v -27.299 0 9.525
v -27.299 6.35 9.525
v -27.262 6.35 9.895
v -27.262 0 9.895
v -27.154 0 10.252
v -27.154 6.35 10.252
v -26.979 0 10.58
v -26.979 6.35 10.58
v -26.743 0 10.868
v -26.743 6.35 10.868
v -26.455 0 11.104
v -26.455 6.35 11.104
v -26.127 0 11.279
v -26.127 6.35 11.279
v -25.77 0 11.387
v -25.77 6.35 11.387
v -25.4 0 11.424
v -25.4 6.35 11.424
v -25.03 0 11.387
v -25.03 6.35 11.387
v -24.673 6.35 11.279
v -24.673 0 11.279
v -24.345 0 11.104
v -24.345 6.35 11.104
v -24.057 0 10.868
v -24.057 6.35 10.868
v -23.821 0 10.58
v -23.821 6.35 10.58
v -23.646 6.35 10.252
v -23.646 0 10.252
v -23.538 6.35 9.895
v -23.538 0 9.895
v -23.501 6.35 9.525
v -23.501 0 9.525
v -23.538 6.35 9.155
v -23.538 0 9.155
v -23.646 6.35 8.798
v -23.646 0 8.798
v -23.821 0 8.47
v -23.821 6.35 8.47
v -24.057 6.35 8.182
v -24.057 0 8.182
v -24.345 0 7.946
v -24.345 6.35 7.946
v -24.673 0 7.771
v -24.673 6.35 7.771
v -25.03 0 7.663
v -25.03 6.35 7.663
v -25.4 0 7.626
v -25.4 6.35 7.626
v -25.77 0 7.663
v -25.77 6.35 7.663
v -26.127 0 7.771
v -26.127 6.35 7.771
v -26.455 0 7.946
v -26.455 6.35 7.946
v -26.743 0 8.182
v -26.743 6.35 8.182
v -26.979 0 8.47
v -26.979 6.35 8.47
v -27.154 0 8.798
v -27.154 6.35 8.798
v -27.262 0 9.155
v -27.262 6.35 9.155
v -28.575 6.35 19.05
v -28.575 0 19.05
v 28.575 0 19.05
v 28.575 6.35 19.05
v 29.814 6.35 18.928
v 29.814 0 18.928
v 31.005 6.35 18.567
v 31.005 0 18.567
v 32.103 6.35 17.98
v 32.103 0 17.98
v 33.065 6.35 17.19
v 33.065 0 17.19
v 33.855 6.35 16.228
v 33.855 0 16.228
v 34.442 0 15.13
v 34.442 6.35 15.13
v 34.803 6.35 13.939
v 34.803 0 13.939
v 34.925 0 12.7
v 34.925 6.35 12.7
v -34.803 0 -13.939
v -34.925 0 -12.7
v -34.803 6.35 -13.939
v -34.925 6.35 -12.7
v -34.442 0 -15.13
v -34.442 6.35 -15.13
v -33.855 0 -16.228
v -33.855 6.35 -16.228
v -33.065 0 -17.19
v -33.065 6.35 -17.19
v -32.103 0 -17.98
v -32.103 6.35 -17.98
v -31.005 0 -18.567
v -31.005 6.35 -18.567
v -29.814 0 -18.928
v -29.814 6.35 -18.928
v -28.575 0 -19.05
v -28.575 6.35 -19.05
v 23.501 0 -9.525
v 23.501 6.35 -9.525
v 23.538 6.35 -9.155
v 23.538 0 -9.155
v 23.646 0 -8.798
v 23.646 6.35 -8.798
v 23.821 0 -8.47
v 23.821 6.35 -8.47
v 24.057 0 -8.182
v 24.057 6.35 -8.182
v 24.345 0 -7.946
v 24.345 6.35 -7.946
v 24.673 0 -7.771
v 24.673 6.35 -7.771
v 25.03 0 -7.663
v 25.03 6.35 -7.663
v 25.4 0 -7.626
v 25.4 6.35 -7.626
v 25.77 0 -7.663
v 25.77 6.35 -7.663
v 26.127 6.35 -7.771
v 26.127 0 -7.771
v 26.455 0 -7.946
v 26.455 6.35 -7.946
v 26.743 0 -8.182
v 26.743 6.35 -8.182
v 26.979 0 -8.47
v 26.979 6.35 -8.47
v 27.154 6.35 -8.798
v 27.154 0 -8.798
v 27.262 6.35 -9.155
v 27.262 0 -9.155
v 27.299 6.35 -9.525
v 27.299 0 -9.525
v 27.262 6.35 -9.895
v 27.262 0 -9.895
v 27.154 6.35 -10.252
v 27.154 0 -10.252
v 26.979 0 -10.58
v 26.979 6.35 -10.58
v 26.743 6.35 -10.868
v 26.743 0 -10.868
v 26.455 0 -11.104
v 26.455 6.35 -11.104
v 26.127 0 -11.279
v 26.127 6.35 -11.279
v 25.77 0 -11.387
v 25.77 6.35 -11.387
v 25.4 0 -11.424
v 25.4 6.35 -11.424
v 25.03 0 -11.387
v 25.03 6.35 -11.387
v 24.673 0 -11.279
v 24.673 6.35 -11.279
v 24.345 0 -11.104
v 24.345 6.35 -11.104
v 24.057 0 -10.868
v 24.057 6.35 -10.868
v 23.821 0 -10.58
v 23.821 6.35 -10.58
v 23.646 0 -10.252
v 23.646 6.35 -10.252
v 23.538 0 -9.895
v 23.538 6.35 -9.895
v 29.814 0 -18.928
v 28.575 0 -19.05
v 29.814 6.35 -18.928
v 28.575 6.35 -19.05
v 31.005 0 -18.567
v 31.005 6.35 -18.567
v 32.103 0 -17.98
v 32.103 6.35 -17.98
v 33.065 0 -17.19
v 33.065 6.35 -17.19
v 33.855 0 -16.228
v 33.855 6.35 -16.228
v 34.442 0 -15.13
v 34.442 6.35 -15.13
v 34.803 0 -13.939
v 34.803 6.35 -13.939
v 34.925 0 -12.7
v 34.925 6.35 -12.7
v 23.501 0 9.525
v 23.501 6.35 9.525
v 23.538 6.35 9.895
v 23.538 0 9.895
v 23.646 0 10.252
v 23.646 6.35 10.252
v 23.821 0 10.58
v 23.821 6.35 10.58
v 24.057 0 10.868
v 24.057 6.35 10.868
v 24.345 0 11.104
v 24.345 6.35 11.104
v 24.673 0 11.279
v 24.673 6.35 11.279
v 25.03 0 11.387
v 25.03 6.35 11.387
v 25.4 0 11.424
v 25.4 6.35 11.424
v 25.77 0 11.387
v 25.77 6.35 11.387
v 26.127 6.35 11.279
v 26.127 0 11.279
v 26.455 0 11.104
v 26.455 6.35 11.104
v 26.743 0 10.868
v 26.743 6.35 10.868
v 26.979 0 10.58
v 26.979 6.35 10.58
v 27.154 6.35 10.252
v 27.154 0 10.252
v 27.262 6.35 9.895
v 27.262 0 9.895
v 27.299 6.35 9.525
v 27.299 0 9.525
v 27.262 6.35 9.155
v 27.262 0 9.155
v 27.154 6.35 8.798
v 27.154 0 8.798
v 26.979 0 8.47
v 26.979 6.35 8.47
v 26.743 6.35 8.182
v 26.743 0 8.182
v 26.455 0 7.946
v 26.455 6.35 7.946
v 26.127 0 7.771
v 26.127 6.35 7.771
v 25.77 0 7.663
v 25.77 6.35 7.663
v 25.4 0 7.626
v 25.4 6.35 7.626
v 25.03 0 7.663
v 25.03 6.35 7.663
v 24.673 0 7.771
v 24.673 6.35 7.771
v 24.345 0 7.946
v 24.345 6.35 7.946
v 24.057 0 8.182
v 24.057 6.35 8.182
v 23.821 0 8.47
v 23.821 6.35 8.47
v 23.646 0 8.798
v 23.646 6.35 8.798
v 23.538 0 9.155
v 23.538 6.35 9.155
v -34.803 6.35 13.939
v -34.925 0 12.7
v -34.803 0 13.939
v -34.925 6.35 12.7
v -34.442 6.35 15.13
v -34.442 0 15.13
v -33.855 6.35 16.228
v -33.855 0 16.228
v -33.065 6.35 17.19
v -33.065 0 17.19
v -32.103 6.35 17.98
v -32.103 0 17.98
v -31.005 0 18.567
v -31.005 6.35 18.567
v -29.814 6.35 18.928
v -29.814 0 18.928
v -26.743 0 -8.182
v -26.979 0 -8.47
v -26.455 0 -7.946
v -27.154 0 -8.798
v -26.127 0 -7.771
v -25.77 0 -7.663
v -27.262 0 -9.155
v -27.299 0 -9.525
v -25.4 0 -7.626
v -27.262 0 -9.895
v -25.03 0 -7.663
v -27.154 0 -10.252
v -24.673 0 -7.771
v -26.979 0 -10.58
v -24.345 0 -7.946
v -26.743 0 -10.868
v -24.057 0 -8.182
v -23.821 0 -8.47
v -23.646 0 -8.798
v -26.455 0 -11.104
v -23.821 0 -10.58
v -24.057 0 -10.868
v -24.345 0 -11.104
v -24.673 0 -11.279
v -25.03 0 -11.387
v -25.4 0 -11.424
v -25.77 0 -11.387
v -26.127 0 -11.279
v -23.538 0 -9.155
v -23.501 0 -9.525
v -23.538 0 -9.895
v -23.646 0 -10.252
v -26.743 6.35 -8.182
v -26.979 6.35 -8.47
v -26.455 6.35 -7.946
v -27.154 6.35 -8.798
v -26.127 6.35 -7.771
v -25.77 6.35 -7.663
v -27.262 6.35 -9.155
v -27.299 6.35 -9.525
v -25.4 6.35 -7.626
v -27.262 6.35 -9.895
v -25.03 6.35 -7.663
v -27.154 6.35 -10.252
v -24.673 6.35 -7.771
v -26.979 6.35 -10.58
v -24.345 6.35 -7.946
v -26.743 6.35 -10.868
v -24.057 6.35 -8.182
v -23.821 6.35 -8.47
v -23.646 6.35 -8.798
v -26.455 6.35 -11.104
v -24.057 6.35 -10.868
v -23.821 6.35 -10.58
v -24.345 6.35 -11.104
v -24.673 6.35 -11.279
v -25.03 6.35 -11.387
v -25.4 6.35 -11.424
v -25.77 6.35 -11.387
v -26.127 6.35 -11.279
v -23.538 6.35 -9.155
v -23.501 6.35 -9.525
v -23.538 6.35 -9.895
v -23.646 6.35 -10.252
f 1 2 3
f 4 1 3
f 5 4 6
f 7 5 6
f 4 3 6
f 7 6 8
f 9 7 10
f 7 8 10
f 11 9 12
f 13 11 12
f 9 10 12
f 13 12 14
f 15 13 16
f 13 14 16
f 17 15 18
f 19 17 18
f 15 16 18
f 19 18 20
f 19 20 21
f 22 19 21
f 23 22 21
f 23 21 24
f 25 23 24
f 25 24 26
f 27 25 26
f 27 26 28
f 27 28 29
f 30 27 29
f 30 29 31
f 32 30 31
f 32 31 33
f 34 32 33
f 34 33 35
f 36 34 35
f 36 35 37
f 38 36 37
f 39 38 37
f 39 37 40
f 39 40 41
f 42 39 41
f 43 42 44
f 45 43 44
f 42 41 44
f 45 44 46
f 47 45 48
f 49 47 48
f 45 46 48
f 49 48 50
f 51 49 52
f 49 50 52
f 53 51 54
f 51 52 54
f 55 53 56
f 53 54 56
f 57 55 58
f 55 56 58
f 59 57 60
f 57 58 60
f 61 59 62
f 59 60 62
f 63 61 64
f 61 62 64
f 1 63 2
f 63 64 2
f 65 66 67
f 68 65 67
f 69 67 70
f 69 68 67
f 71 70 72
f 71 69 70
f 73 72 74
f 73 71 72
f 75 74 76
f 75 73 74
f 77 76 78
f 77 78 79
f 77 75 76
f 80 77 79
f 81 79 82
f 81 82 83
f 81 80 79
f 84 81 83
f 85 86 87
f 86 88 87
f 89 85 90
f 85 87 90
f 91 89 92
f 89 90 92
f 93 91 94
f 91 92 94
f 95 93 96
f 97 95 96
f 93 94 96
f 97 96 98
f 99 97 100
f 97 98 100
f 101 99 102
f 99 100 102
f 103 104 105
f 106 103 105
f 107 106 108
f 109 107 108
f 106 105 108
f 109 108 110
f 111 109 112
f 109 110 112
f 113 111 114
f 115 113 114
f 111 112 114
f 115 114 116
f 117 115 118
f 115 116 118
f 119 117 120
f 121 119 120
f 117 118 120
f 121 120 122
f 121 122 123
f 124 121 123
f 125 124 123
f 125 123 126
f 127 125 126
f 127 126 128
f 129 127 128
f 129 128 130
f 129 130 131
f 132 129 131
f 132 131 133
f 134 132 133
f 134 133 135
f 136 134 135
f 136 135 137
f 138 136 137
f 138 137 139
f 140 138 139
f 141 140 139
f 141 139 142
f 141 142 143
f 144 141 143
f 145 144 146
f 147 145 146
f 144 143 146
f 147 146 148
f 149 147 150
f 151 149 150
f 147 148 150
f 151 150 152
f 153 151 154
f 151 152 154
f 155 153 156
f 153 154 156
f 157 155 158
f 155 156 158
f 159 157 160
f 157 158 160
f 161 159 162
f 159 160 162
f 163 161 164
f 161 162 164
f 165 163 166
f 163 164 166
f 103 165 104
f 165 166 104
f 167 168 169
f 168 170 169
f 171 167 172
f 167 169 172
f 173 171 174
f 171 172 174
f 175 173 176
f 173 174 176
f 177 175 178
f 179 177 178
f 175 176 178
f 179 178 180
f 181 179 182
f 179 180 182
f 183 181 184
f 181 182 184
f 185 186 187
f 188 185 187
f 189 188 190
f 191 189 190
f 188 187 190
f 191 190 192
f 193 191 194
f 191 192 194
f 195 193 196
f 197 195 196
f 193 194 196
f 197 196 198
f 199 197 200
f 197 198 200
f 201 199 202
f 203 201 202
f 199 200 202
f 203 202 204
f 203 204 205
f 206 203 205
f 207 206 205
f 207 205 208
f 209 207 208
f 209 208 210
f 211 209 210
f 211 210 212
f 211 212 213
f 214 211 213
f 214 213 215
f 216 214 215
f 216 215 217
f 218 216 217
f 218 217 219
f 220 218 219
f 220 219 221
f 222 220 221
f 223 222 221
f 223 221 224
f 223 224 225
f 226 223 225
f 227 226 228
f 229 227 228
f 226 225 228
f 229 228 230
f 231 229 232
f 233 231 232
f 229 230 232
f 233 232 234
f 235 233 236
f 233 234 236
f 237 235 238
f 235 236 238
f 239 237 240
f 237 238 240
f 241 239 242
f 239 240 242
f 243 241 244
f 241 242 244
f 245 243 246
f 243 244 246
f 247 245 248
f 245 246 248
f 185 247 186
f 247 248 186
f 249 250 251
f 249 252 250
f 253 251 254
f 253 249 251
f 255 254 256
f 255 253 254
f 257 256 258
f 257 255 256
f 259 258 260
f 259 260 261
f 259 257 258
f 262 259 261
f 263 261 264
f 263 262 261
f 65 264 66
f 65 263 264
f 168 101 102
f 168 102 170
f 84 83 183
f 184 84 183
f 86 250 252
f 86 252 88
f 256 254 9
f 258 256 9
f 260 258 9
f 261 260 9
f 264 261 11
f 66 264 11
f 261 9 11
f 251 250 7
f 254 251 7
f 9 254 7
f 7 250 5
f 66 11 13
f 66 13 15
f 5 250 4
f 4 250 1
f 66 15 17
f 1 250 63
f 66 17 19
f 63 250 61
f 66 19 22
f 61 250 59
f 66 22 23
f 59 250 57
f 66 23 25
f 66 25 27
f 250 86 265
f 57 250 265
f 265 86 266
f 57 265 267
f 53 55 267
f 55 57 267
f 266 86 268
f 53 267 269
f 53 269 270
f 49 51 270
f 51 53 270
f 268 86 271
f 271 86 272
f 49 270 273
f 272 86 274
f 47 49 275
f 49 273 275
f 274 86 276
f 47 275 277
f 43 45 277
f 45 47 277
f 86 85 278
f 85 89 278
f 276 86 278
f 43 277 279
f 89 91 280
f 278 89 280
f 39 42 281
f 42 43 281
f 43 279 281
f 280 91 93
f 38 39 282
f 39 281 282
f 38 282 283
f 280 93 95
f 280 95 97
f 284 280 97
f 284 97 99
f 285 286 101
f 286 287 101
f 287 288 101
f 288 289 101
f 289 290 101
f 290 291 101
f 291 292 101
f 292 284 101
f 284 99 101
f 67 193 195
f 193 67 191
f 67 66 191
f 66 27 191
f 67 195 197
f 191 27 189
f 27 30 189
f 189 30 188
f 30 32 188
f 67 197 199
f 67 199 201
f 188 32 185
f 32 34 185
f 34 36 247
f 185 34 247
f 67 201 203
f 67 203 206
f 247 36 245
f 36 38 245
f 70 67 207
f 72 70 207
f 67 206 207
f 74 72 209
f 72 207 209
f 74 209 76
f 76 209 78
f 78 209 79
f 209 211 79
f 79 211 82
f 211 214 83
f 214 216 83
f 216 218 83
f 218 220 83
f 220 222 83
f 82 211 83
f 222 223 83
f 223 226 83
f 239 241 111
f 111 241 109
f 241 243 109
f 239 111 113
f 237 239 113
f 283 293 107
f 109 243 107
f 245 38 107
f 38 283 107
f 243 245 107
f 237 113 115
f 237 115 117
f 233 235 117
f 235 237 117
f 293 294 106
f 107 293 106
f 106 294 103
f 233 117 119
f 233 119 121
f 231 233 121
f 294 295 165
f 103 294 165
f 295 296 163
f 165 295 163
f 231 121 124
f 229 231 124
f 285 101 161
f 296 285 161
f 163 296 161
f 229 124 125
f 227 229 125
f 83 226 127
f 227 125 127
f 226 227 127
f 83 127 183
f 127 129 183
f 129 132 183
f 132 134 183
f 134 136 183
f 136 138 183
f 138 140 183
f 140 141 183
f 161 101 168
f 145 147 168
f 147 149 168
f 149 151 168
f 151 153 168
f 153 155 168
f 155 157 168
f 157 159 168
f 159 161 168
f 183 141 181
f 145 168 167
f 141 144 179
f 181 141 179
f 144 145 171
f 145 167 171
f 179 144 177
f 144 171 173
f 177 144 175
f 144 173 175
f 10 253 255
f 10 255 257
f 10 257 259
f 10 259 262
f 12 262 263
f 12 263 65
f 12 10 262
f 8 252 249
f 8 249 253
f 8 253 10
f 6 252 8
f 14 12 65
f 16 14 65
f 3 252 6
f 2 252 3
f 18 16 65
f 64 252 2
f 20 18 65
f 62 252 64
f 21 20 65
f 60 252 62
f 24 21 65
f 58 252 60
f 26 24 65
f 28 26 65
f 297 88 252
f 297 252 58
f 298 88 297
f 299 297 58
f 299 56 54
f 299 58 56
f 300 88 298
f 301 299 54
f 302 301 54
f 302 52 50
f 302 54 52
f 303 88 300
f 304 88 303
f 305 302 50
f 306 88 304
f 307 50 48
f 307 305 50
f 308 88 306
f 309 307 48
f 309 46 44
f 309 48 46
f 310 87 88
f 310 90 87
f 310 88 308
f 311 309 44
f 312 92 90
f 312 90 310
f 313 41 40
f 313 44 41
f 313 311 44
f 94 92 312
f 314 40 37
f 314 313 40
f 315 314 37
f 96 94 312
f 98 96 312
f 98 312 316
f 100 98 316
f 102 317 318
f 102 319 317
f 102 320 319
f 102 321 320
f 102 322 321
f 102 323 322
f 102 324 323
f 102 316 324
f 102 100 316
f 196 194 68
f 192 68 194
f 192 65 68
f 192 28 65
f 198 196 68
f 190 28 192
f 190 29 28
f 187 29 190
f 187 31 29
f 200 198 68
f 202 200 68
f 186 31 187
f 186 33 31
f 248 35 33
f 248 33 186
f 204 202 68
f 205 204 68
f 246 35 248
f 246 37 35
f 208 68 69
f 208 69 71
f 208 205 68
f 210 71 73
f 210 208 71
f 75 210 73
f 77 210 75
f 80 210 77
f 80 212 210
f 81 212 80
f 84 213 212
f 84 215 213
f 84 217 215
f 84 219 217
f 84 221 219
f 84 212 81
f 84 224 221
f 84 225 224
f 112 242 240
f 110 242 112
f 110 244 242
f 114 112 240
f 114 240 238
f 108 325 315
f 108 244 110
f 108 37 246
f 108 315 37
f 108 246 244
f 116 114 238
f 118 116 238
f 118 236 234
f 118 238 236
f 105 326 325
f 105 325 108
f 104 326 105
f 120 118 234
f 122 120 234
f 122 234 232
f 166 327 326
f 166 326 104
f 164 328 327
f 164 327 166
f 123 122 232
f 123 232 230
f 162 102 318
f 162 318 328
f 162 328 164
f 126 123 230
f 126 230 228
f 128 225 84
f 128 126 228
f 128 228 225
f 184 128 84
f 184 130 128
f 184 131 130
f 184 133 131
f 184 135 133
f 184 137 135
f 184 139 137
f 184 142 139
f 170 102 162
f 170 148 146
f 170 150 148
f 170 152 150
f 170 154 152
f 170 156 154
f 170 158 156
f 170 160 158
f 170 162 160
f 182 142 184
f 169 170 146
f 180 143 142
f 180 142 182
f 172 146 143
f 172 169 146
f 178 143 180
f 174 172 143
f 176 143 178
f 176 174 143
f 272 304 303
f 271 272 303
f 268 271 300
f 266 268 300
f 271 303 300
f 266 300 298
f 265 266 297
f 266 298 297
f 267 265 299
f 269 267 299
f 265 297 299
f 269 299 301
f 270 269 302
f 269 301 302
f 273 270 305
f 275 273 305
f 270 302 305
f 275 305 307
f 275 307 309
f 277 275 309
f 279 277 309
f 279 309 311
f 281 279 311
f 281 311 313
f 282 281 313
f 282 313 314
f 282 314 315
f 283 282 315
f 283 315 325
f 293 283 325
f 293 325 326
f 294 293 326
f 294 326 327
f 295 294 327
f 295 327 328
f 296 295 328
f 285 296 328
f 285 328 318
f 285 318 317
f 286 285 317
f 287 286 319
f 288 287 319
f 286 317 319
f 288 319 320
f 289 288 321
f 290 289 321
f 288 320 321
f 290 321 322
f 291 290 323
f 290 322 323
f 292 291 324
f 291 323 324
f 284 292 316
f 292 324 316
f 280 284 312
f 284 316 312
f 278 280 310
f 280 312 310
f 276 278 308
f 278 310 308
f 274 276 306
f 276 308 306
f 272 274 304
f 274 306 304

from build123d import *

# Parameters (mm, degrees)
SKETCH1_W                 = 69.85
SKETCH1_H                 = 38.1
BOSS_EXTRUDE1_DEPTH       = 6.35
F_6_CLEARANCE_HOLE1_D     = 3.7973
F_6_CLEARANCE_HOLE1_DEPTH = 25.4
F_6_CLEARANCE_HOLE1_TIP   = 1.140824014
FILLET1_R                 = 6.35


with BuildPart() as part:
    # Sketch1 → Boss-Extrude1 (new body)
    with BuildSketch(Plane(origin=(0, 0, 0), x_dir=(1, 0, 0), z_dir=(0, 1, 0))):
        Rectangle(SKETCH1_W, SKETCH1_H)
    extrude(amount=BOSS_EXTRUDE1_DEPTH)

    # #6 Clearance Hole1
    with Locations(Plane.XZ):
        with Locations((-25.4, 9.525), (25.4, -9.525), (-25.4, -9.525), (25.4, 9.525)):
            Hole(F_6_CLEARANCE_HOLE1_D / 2, depth=F_6_CLEARANCE_HOLE1_DEPTH)
            with Locations((0, 0, -(F_6_CLEARANCE_HOLE1_DEPTH + F_6_CLEARANCE_HOLE1_TIP / 2))):  # 118° drill point
                Cone(0, F_6_CLEARANCE_HOLE1_D / 2, F_6_CLEARANCE_HOLE1_TIP, mode=Mode.SUBTRACT)

    # Fillet1
    fillet1_edges = [part.edges().sort_by_distance(p)[0] for p in [
        (-34.925, 3.175, -19.05),
        (34.925, 3.175, -19.05),
        (34.925, 3.175, 19.05),
        (-34.925, 3.175, 19.05),
    ]]
    fillet(fillet1_edges, radius=FILLET1_R)


solid = part.part
